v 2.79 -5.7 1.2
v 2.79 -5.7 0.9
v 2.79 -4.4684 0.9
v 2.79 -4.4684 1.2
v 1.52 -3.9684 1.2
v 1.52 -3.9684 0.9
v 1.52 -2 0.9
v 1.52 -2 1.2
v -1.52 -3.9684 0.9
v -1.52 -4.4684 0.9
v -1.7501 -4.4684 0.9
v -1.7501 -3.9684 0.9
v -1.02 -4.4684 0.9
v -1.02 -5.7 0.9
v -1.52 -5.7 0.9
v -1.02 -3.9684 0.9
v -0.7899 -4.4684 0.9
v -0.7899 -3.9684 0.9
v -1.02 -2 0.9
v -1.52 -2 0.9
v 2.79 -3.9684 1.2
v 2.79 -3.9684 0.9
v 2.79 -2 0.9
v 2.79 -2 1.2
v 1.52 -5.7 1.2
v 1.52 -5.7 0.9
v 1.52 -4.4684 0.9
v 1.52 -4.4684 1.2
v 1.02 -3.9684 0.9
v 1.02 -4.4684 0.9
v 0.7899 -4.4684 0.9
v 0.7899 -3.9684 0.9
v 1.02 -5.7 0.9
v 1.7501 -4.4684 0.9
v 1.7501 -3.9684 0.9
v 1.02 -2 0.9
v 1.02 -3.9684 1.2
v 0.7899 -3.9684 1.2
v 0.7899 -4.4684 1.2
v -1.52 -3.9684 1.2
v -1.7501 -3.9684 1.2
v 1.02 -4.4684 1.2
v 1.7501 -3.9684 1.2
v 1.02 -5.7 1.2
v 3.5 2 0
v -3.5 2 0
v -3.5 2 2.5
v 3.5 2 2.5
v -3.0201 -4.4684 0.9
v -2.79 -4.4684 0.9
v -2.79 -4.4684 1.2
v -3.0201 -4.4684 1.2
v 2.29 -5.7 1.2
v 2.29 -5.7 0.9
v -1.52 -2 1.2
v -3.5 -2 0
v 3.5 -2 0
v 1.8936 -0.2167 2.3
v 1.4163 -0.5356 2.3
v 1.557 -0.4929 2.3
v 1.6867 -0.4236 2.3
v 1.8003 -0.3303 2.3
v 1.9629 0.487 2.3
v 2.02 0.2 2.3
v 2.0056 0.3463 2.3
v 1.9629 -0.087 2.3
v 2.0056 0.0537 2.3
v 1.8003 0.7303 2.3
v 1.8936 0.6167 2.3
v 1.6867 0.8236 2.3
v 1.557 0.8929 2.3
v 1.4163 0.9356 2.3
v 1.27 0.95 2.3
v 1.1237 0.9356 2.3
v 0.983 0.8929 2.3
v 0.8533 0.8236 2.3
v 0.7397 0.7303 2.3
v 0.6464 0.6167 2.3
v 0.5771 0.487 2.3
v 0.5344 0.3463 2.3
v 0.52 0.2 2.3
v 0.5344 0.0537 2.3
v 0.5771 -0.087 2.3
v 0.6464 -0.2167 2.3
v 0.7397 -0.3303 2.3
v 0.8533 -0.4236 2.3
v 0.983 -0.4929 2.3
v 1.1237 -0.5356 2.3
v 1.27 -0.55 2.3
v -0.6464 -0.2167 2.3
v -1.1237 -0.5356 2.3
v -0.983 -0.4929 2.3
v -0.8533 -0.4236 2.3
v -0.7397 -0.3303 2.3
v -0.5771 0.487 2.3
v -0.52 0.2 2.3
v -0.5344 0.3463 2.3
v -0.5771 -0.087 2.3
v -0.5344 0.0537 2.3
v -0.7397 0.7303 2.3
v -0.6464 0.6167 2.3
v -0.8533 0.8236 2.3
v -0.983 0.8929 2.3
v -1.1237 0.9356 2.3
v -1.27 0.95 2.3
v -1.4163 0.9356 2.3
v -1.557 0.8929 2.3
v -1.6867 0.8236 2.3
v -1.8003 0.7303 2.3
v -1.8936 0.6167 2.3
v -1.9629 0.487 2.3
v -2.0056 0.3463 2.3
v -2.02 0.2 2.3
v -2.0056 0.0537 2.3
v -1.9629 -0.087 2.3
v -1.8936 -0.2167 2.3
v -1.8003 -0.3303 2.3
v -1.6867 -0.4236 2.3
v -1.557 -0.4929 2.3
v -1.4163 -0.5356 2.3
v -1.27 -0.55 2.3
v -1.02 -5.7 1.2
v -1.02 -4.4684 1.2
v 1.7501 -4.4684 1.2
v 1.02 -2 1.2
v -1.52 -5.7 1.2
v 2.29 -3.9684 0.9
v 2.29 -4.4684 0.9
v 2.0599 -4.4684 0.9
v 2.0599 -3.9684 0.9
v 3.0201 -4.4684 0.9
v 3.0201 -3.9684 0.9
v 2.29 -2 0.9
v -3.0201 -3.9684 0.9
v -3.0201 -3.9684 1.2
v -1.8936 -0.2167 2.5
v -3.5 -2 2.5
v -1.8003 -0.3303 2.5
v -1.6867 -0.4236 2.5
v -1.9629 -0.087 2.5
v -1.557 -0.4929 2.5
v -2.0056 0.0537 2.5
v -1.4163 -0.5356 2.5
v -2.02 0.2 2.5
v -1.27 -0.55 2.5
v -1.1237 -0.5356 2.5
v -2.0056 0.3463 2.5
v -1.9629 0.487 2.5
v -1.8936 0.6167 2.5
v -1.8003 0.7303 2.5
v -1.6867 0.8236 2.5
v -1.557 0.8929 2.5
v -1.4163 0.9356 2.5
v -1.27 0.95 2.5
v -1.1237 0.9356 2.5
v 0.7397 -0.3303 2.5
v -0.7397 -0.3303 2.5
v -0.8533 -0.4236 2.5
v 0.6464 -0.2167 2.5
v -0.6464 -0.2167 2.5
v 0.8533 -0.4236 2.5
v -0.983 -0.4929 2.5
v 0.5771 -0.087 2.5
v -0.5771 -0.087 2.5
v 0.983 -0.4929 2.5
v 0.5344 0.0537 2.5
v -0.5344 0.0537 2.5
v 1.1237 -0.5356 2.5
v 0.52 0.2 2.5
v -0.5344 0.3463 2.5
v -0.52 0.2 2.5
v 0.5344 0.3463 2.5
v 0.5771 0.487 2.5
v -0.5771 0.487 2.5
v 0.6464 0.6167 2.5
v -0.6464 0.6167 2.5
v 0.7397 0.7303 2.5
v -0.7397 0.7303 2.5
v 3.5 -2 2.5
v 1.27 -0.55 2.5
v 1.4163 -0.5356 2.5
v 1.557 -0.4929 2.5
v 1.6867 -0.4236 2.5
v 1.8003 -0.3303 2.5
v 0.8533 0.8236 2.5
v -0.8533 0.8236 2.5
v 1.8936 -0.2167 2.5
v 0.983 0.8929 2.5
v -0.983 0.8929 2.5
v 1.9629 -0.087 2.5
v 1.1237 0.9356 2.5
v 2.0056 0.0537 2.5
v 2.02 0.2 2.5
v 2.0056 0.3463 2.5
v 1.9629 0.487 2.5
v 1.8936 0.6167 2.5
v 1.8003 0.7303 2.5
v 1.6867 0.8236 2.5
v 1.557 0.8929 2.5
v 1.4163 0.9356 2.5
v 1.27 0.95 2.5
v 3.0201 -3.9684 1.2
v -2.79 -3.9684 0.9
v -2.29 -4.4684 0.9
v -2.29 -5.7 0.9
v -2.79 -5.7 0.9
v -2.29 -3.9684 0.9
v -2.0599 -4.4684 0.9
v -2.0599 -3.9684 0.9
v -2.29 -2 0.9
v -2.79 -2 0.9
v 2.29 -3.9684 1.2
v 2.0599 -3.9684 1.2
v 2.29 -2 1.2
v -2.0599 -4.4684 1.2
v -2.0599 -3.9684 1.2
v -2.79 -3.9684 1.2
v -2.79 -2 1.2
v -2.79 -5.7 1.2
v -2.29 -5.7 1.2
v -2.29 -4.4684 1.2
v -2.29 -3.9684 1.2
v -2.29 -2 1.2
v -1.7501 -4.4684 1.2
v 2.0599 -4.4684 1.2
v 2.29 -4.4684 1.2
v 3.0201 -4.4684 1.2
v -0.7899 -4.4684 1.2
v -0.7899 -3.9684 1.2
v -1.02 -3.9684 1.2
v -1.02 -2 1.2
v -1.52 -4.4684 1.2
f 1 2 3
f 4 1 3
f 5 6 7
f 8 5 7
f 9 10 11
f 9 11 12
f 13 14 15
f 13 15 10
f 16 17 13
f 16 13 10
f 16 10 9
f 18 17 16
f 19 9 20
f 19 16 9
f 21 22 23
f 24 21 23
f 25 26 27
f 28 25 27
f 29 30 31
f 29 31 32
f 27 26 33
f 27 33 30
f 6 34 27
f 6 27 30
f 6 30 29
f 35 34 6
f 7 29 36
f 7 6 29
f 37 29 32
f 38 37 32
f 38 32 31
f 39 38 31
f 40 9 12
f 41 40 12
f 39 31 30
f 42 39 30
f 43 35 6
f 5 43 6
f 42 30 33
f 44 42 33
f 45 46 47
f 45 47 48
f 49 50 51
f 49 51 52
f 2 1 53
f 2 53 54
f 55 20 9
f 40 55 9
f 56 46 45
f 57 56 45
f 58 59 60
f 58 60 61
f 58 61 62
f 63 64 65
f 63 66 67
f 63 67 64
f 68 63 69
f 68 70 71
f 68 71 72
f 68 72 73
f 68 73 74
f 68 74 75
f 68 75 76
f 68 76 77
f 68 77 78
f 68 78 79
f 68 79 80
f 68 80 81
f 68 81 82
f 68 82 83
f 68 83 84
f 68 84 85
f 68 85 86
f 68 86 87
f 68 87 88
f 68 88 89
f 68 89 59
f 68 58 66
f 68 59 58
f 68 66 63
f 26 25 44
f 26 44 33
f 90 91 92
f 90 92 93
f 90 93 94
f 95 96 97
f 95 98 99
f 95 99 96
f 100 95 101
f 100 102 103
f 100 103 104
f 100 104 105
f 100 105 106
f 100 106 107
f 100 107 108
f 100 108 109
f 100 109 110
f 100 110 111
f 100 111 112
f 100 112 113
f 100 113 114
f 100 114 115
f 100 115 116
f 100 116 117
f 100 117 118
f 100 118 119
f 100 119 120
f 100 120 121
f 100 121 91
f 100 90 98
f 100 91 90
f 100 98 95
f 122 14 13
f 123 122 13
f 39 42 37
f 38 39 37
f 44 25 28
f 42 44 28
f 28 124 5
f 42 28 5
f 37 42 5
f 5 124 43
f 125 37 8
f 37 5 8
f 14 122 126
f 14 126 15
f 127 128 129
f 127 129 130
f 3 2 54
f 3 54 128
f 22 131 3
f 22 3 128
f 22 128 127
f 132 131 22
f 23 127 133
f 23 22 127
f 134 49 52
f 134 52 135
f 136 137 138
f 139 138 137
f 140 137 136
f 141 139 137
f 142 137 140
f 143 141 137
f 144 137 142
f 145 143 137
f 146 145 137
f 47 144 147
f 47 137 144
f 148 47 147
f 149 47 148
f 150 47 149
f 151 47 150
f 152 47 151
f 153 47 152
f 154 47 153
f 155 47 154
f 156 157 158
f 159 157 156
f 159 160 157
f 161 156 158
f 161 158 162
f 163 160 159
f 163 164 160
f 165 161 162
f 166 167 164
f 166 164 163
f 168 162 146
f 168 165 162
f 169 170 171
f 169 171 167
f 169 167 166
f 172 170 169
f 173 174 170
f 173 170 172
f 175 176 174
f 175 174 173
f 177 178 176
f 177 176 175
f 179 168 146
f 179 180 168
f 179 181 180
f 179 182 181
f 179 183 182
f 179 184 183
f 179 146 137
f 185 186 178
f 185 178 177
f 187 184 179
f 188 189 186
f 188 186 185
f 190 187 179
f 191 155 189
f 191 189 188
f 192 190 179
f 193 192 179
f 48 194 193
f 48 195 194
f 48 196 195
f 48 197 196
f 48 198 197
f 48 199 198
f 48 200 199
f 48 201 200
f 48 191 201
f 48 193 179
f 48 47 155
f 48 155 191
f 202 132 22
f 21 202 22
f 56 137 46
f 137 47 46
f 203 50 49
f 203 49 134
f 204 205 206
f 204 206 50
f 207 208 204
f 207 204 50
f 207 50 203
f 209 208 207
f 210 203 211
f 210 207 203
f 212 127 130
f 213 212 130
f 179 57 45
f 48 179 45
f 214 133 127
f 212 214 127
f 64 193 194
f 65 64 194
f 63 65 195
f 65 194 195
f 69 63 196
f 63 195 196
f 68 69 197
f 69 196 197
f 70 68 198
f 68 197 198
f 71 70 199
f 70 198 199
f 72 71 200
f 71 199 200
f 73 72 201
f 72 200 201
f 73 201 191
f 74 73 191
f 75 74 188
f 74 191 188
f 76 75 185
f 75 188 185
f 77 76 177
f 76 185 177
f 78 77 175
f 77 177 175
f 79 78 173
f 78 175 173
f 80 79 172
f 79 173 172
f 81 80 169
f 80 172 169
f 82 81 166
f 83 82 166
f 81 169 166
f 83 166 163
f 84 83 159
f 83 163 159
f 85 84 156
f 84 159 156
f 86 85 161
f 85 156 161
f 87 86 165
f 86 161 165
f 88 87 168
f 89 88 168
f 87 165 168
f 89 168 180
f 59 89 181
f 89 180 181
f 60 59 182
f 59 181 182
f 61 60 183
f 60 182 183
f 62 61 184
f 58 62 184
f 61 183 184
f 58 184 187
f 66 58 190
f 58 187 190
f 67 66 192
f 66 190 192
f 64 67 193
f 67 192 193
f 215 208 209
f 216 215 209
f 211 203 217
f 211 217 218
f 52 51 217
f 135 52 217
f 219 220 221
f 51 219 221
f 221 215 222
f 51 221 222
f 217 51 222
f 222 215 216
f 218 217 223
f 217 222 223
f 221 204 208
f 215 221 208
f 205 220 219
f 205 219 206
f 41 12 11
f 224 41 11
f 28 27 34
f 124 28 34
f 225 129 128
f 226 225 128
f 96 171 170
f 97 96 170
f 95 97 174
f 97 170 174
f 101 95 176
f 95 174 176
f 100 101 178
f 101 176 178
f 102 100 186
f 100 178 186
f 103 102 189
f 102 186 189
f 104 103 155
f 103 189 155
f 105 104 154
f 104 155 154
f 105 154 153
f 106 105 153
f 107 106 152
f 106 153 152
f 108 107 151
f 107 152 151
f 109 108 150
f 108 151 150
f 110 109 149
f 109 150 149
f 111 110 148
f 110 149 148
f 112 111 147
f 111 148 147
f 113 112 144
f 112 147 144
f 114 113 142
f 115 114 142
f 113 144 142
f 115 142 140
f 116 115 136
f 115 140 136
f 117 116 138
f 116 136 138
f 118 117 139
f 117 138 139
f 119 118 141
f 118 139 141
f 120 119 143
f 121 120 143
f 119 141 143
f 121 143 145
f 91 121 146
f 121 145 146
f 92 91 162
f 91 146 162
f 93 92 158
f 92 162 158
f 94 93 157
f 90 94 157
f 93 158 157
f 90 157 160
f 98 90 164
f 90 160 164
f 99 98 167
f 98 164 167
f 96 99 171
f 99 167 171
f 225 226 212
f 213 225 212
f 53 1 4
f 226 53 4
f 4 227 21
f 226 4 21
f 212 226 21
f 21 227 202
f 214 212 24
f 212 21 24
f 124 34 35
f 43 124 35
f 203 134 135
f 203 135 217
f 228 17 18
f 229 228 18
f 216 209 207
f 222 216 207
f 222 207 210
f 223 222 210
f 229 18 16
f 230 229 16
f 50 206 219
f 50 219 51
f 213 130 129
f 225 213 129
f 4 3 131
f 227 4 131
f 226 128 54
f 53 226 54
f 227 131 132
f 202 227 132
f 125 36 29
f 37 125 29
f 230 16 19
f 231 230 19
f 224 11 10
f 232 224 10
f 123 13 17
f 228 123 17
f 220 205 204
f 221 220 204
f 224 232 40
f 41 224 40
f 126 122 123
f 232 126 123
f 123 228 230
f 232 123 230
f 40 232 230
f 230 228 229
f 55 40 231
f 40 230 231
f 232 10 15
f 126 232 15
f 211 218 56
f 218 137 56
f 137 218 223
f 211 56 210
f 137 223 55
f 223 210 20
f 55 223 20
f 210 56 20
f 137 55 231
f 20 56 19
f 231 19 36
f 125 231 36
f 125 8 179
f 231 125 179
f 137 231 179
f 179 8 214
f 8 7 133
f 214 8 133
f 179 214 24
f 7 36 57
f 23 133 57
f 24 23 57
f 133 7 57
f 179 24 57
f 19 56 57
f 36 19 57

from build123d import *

# Parameters (mm, degrees)
SKETCH1_W                = 7
SKETCH1_H                = 4
BOSS_EXTRUDE1_DEPTH      = 2.5
SKETCH2_R                = 0.75
CUT_EXTRUDE1_DEPTH       = 0.2
SKETCH3_W                = 0.3
SKETCH3_H                = 3.7
BOSS_EXTRUDE2_DEPTH      = 3.5
BOSS_EXTRUDE2_DEPTH_BACK = 3.5
CUT_EXTRUDE2_DEPTH       = 3.5
CUT_EXTRUDE2_DEPTH_BACK  = 1


with BuildPart() as part:
    # Sketch1 → Boss-Extrude1 (new body)
    with BuildSketch(Plane.XY):
        Rectangle(SKETCH1_W, SKETCH1_H)
    extrude(amount=BOSS_EXTRUDE1_DEPTH)

    # Sketch2 → Cut-Extrude1 (cut)
    with BuildSketch(Plane.XY.offset(2.5)):
        with Locations((-1.27, 0.2)):
            Circle(SKETCH2_R)
        with Locations((1.27, 0.2)):
            Circle(SKETCH2_R)
    extrude(amount=-CUT_EXTRUDE1_DEPTH, mode=Mode.SUBTRACT)

    # Sketch3 → Boss-Extrude2 (add, two sides)
    with BuildSketch(Plane(origin=(0, 0, 0), x_dir=(0, 0, -1), z_dir=(1, 0, 0))) as boss_extrude2_sk:
        with Locations((-1.05, -3.85)):
            Rectangle(SKETCH3_W, SKETCH3_H)
    extrude(amount=BOSS_EXTRUDE2_DEPTH)
    extrude(boss_extrude2_sk.sketch, amount=-BOSS_EXTRUDE2_DEPTH_BACK)

    # Sketch4 → Cut-Extrude2 (cut, two sides)
    with BuildSketch(Plane.XY) as cut_extrude2_sk:
        Polygon((-2.79, -6.068420348), (-2.79, -4.468420348), (-3.020094846, -4.468420348), (-3.020094846, -3.968420348), (-2.79, -3.968420348), (-2.79, -2), (-4.136093054, -2), (-4.136093054, -6.068420348), align=None)
        Polygon((-2.29, -6.068420348), (-2.29, -4.468420348), (-2.059905154, -4.468420348), (-2.059905154, -3.968420348), (-2.29, -3.968420348), (-2.29, -2), (-1.52, -2), (-1.52, -3.968420348), (-1.750094846, -3.968420348), (-1.750094846, -4.468420348), (-1.52, -4.468420348), (-1.52, -6.068420348), align=None)
        Polygon((-1.02, -2), (1.02, -2), (1.02, -3.968420348), (0.789905154, -3.968420348), (0.789905154, -4.468420348), (1.02, -4.468420348), (1.02, -6.068420348), (-1.02, -6.068420348), (-1.02, -4.468420348), (-0.789905154, -4.468420348), (-0.789905154, -3.968420348), (-1.02, -3.968420348), align=None)
        Polygon((4.136093054, -6.068420348), (2.79, -6.068420348), (2.79, -4.468420348), (3.020094846, -4.468420348), (3.020094846, -3.968420348), (2.79, -3.968420348), (2.79, -2), (4.136093054, -2), align=None)
        Polygon((1.52, -6.068420348), (1.52, -4.468420348), (1.750094846, -4.468420348), (1.750094846, -3.968420348), (1.52, -3.968420348), (1.52, -2), (2.29, -2), (2.29, -3.968420348), (2.059905154, -3.968420348), (2.059905154, -4.468420348), (2.29, -4.468420348), (2.29, -6.068420348), align=None)
    extrude(amount=CUT_EXTRUDE2_DEPTH, mode=Mode.SUBTRACT)
    extrude(cut_extrude2_sk.sketch, amount=-CUT_EXTRUDE2_DEPTH_BACK, mode=Mode.SUBTRACT)


solid = part.part
